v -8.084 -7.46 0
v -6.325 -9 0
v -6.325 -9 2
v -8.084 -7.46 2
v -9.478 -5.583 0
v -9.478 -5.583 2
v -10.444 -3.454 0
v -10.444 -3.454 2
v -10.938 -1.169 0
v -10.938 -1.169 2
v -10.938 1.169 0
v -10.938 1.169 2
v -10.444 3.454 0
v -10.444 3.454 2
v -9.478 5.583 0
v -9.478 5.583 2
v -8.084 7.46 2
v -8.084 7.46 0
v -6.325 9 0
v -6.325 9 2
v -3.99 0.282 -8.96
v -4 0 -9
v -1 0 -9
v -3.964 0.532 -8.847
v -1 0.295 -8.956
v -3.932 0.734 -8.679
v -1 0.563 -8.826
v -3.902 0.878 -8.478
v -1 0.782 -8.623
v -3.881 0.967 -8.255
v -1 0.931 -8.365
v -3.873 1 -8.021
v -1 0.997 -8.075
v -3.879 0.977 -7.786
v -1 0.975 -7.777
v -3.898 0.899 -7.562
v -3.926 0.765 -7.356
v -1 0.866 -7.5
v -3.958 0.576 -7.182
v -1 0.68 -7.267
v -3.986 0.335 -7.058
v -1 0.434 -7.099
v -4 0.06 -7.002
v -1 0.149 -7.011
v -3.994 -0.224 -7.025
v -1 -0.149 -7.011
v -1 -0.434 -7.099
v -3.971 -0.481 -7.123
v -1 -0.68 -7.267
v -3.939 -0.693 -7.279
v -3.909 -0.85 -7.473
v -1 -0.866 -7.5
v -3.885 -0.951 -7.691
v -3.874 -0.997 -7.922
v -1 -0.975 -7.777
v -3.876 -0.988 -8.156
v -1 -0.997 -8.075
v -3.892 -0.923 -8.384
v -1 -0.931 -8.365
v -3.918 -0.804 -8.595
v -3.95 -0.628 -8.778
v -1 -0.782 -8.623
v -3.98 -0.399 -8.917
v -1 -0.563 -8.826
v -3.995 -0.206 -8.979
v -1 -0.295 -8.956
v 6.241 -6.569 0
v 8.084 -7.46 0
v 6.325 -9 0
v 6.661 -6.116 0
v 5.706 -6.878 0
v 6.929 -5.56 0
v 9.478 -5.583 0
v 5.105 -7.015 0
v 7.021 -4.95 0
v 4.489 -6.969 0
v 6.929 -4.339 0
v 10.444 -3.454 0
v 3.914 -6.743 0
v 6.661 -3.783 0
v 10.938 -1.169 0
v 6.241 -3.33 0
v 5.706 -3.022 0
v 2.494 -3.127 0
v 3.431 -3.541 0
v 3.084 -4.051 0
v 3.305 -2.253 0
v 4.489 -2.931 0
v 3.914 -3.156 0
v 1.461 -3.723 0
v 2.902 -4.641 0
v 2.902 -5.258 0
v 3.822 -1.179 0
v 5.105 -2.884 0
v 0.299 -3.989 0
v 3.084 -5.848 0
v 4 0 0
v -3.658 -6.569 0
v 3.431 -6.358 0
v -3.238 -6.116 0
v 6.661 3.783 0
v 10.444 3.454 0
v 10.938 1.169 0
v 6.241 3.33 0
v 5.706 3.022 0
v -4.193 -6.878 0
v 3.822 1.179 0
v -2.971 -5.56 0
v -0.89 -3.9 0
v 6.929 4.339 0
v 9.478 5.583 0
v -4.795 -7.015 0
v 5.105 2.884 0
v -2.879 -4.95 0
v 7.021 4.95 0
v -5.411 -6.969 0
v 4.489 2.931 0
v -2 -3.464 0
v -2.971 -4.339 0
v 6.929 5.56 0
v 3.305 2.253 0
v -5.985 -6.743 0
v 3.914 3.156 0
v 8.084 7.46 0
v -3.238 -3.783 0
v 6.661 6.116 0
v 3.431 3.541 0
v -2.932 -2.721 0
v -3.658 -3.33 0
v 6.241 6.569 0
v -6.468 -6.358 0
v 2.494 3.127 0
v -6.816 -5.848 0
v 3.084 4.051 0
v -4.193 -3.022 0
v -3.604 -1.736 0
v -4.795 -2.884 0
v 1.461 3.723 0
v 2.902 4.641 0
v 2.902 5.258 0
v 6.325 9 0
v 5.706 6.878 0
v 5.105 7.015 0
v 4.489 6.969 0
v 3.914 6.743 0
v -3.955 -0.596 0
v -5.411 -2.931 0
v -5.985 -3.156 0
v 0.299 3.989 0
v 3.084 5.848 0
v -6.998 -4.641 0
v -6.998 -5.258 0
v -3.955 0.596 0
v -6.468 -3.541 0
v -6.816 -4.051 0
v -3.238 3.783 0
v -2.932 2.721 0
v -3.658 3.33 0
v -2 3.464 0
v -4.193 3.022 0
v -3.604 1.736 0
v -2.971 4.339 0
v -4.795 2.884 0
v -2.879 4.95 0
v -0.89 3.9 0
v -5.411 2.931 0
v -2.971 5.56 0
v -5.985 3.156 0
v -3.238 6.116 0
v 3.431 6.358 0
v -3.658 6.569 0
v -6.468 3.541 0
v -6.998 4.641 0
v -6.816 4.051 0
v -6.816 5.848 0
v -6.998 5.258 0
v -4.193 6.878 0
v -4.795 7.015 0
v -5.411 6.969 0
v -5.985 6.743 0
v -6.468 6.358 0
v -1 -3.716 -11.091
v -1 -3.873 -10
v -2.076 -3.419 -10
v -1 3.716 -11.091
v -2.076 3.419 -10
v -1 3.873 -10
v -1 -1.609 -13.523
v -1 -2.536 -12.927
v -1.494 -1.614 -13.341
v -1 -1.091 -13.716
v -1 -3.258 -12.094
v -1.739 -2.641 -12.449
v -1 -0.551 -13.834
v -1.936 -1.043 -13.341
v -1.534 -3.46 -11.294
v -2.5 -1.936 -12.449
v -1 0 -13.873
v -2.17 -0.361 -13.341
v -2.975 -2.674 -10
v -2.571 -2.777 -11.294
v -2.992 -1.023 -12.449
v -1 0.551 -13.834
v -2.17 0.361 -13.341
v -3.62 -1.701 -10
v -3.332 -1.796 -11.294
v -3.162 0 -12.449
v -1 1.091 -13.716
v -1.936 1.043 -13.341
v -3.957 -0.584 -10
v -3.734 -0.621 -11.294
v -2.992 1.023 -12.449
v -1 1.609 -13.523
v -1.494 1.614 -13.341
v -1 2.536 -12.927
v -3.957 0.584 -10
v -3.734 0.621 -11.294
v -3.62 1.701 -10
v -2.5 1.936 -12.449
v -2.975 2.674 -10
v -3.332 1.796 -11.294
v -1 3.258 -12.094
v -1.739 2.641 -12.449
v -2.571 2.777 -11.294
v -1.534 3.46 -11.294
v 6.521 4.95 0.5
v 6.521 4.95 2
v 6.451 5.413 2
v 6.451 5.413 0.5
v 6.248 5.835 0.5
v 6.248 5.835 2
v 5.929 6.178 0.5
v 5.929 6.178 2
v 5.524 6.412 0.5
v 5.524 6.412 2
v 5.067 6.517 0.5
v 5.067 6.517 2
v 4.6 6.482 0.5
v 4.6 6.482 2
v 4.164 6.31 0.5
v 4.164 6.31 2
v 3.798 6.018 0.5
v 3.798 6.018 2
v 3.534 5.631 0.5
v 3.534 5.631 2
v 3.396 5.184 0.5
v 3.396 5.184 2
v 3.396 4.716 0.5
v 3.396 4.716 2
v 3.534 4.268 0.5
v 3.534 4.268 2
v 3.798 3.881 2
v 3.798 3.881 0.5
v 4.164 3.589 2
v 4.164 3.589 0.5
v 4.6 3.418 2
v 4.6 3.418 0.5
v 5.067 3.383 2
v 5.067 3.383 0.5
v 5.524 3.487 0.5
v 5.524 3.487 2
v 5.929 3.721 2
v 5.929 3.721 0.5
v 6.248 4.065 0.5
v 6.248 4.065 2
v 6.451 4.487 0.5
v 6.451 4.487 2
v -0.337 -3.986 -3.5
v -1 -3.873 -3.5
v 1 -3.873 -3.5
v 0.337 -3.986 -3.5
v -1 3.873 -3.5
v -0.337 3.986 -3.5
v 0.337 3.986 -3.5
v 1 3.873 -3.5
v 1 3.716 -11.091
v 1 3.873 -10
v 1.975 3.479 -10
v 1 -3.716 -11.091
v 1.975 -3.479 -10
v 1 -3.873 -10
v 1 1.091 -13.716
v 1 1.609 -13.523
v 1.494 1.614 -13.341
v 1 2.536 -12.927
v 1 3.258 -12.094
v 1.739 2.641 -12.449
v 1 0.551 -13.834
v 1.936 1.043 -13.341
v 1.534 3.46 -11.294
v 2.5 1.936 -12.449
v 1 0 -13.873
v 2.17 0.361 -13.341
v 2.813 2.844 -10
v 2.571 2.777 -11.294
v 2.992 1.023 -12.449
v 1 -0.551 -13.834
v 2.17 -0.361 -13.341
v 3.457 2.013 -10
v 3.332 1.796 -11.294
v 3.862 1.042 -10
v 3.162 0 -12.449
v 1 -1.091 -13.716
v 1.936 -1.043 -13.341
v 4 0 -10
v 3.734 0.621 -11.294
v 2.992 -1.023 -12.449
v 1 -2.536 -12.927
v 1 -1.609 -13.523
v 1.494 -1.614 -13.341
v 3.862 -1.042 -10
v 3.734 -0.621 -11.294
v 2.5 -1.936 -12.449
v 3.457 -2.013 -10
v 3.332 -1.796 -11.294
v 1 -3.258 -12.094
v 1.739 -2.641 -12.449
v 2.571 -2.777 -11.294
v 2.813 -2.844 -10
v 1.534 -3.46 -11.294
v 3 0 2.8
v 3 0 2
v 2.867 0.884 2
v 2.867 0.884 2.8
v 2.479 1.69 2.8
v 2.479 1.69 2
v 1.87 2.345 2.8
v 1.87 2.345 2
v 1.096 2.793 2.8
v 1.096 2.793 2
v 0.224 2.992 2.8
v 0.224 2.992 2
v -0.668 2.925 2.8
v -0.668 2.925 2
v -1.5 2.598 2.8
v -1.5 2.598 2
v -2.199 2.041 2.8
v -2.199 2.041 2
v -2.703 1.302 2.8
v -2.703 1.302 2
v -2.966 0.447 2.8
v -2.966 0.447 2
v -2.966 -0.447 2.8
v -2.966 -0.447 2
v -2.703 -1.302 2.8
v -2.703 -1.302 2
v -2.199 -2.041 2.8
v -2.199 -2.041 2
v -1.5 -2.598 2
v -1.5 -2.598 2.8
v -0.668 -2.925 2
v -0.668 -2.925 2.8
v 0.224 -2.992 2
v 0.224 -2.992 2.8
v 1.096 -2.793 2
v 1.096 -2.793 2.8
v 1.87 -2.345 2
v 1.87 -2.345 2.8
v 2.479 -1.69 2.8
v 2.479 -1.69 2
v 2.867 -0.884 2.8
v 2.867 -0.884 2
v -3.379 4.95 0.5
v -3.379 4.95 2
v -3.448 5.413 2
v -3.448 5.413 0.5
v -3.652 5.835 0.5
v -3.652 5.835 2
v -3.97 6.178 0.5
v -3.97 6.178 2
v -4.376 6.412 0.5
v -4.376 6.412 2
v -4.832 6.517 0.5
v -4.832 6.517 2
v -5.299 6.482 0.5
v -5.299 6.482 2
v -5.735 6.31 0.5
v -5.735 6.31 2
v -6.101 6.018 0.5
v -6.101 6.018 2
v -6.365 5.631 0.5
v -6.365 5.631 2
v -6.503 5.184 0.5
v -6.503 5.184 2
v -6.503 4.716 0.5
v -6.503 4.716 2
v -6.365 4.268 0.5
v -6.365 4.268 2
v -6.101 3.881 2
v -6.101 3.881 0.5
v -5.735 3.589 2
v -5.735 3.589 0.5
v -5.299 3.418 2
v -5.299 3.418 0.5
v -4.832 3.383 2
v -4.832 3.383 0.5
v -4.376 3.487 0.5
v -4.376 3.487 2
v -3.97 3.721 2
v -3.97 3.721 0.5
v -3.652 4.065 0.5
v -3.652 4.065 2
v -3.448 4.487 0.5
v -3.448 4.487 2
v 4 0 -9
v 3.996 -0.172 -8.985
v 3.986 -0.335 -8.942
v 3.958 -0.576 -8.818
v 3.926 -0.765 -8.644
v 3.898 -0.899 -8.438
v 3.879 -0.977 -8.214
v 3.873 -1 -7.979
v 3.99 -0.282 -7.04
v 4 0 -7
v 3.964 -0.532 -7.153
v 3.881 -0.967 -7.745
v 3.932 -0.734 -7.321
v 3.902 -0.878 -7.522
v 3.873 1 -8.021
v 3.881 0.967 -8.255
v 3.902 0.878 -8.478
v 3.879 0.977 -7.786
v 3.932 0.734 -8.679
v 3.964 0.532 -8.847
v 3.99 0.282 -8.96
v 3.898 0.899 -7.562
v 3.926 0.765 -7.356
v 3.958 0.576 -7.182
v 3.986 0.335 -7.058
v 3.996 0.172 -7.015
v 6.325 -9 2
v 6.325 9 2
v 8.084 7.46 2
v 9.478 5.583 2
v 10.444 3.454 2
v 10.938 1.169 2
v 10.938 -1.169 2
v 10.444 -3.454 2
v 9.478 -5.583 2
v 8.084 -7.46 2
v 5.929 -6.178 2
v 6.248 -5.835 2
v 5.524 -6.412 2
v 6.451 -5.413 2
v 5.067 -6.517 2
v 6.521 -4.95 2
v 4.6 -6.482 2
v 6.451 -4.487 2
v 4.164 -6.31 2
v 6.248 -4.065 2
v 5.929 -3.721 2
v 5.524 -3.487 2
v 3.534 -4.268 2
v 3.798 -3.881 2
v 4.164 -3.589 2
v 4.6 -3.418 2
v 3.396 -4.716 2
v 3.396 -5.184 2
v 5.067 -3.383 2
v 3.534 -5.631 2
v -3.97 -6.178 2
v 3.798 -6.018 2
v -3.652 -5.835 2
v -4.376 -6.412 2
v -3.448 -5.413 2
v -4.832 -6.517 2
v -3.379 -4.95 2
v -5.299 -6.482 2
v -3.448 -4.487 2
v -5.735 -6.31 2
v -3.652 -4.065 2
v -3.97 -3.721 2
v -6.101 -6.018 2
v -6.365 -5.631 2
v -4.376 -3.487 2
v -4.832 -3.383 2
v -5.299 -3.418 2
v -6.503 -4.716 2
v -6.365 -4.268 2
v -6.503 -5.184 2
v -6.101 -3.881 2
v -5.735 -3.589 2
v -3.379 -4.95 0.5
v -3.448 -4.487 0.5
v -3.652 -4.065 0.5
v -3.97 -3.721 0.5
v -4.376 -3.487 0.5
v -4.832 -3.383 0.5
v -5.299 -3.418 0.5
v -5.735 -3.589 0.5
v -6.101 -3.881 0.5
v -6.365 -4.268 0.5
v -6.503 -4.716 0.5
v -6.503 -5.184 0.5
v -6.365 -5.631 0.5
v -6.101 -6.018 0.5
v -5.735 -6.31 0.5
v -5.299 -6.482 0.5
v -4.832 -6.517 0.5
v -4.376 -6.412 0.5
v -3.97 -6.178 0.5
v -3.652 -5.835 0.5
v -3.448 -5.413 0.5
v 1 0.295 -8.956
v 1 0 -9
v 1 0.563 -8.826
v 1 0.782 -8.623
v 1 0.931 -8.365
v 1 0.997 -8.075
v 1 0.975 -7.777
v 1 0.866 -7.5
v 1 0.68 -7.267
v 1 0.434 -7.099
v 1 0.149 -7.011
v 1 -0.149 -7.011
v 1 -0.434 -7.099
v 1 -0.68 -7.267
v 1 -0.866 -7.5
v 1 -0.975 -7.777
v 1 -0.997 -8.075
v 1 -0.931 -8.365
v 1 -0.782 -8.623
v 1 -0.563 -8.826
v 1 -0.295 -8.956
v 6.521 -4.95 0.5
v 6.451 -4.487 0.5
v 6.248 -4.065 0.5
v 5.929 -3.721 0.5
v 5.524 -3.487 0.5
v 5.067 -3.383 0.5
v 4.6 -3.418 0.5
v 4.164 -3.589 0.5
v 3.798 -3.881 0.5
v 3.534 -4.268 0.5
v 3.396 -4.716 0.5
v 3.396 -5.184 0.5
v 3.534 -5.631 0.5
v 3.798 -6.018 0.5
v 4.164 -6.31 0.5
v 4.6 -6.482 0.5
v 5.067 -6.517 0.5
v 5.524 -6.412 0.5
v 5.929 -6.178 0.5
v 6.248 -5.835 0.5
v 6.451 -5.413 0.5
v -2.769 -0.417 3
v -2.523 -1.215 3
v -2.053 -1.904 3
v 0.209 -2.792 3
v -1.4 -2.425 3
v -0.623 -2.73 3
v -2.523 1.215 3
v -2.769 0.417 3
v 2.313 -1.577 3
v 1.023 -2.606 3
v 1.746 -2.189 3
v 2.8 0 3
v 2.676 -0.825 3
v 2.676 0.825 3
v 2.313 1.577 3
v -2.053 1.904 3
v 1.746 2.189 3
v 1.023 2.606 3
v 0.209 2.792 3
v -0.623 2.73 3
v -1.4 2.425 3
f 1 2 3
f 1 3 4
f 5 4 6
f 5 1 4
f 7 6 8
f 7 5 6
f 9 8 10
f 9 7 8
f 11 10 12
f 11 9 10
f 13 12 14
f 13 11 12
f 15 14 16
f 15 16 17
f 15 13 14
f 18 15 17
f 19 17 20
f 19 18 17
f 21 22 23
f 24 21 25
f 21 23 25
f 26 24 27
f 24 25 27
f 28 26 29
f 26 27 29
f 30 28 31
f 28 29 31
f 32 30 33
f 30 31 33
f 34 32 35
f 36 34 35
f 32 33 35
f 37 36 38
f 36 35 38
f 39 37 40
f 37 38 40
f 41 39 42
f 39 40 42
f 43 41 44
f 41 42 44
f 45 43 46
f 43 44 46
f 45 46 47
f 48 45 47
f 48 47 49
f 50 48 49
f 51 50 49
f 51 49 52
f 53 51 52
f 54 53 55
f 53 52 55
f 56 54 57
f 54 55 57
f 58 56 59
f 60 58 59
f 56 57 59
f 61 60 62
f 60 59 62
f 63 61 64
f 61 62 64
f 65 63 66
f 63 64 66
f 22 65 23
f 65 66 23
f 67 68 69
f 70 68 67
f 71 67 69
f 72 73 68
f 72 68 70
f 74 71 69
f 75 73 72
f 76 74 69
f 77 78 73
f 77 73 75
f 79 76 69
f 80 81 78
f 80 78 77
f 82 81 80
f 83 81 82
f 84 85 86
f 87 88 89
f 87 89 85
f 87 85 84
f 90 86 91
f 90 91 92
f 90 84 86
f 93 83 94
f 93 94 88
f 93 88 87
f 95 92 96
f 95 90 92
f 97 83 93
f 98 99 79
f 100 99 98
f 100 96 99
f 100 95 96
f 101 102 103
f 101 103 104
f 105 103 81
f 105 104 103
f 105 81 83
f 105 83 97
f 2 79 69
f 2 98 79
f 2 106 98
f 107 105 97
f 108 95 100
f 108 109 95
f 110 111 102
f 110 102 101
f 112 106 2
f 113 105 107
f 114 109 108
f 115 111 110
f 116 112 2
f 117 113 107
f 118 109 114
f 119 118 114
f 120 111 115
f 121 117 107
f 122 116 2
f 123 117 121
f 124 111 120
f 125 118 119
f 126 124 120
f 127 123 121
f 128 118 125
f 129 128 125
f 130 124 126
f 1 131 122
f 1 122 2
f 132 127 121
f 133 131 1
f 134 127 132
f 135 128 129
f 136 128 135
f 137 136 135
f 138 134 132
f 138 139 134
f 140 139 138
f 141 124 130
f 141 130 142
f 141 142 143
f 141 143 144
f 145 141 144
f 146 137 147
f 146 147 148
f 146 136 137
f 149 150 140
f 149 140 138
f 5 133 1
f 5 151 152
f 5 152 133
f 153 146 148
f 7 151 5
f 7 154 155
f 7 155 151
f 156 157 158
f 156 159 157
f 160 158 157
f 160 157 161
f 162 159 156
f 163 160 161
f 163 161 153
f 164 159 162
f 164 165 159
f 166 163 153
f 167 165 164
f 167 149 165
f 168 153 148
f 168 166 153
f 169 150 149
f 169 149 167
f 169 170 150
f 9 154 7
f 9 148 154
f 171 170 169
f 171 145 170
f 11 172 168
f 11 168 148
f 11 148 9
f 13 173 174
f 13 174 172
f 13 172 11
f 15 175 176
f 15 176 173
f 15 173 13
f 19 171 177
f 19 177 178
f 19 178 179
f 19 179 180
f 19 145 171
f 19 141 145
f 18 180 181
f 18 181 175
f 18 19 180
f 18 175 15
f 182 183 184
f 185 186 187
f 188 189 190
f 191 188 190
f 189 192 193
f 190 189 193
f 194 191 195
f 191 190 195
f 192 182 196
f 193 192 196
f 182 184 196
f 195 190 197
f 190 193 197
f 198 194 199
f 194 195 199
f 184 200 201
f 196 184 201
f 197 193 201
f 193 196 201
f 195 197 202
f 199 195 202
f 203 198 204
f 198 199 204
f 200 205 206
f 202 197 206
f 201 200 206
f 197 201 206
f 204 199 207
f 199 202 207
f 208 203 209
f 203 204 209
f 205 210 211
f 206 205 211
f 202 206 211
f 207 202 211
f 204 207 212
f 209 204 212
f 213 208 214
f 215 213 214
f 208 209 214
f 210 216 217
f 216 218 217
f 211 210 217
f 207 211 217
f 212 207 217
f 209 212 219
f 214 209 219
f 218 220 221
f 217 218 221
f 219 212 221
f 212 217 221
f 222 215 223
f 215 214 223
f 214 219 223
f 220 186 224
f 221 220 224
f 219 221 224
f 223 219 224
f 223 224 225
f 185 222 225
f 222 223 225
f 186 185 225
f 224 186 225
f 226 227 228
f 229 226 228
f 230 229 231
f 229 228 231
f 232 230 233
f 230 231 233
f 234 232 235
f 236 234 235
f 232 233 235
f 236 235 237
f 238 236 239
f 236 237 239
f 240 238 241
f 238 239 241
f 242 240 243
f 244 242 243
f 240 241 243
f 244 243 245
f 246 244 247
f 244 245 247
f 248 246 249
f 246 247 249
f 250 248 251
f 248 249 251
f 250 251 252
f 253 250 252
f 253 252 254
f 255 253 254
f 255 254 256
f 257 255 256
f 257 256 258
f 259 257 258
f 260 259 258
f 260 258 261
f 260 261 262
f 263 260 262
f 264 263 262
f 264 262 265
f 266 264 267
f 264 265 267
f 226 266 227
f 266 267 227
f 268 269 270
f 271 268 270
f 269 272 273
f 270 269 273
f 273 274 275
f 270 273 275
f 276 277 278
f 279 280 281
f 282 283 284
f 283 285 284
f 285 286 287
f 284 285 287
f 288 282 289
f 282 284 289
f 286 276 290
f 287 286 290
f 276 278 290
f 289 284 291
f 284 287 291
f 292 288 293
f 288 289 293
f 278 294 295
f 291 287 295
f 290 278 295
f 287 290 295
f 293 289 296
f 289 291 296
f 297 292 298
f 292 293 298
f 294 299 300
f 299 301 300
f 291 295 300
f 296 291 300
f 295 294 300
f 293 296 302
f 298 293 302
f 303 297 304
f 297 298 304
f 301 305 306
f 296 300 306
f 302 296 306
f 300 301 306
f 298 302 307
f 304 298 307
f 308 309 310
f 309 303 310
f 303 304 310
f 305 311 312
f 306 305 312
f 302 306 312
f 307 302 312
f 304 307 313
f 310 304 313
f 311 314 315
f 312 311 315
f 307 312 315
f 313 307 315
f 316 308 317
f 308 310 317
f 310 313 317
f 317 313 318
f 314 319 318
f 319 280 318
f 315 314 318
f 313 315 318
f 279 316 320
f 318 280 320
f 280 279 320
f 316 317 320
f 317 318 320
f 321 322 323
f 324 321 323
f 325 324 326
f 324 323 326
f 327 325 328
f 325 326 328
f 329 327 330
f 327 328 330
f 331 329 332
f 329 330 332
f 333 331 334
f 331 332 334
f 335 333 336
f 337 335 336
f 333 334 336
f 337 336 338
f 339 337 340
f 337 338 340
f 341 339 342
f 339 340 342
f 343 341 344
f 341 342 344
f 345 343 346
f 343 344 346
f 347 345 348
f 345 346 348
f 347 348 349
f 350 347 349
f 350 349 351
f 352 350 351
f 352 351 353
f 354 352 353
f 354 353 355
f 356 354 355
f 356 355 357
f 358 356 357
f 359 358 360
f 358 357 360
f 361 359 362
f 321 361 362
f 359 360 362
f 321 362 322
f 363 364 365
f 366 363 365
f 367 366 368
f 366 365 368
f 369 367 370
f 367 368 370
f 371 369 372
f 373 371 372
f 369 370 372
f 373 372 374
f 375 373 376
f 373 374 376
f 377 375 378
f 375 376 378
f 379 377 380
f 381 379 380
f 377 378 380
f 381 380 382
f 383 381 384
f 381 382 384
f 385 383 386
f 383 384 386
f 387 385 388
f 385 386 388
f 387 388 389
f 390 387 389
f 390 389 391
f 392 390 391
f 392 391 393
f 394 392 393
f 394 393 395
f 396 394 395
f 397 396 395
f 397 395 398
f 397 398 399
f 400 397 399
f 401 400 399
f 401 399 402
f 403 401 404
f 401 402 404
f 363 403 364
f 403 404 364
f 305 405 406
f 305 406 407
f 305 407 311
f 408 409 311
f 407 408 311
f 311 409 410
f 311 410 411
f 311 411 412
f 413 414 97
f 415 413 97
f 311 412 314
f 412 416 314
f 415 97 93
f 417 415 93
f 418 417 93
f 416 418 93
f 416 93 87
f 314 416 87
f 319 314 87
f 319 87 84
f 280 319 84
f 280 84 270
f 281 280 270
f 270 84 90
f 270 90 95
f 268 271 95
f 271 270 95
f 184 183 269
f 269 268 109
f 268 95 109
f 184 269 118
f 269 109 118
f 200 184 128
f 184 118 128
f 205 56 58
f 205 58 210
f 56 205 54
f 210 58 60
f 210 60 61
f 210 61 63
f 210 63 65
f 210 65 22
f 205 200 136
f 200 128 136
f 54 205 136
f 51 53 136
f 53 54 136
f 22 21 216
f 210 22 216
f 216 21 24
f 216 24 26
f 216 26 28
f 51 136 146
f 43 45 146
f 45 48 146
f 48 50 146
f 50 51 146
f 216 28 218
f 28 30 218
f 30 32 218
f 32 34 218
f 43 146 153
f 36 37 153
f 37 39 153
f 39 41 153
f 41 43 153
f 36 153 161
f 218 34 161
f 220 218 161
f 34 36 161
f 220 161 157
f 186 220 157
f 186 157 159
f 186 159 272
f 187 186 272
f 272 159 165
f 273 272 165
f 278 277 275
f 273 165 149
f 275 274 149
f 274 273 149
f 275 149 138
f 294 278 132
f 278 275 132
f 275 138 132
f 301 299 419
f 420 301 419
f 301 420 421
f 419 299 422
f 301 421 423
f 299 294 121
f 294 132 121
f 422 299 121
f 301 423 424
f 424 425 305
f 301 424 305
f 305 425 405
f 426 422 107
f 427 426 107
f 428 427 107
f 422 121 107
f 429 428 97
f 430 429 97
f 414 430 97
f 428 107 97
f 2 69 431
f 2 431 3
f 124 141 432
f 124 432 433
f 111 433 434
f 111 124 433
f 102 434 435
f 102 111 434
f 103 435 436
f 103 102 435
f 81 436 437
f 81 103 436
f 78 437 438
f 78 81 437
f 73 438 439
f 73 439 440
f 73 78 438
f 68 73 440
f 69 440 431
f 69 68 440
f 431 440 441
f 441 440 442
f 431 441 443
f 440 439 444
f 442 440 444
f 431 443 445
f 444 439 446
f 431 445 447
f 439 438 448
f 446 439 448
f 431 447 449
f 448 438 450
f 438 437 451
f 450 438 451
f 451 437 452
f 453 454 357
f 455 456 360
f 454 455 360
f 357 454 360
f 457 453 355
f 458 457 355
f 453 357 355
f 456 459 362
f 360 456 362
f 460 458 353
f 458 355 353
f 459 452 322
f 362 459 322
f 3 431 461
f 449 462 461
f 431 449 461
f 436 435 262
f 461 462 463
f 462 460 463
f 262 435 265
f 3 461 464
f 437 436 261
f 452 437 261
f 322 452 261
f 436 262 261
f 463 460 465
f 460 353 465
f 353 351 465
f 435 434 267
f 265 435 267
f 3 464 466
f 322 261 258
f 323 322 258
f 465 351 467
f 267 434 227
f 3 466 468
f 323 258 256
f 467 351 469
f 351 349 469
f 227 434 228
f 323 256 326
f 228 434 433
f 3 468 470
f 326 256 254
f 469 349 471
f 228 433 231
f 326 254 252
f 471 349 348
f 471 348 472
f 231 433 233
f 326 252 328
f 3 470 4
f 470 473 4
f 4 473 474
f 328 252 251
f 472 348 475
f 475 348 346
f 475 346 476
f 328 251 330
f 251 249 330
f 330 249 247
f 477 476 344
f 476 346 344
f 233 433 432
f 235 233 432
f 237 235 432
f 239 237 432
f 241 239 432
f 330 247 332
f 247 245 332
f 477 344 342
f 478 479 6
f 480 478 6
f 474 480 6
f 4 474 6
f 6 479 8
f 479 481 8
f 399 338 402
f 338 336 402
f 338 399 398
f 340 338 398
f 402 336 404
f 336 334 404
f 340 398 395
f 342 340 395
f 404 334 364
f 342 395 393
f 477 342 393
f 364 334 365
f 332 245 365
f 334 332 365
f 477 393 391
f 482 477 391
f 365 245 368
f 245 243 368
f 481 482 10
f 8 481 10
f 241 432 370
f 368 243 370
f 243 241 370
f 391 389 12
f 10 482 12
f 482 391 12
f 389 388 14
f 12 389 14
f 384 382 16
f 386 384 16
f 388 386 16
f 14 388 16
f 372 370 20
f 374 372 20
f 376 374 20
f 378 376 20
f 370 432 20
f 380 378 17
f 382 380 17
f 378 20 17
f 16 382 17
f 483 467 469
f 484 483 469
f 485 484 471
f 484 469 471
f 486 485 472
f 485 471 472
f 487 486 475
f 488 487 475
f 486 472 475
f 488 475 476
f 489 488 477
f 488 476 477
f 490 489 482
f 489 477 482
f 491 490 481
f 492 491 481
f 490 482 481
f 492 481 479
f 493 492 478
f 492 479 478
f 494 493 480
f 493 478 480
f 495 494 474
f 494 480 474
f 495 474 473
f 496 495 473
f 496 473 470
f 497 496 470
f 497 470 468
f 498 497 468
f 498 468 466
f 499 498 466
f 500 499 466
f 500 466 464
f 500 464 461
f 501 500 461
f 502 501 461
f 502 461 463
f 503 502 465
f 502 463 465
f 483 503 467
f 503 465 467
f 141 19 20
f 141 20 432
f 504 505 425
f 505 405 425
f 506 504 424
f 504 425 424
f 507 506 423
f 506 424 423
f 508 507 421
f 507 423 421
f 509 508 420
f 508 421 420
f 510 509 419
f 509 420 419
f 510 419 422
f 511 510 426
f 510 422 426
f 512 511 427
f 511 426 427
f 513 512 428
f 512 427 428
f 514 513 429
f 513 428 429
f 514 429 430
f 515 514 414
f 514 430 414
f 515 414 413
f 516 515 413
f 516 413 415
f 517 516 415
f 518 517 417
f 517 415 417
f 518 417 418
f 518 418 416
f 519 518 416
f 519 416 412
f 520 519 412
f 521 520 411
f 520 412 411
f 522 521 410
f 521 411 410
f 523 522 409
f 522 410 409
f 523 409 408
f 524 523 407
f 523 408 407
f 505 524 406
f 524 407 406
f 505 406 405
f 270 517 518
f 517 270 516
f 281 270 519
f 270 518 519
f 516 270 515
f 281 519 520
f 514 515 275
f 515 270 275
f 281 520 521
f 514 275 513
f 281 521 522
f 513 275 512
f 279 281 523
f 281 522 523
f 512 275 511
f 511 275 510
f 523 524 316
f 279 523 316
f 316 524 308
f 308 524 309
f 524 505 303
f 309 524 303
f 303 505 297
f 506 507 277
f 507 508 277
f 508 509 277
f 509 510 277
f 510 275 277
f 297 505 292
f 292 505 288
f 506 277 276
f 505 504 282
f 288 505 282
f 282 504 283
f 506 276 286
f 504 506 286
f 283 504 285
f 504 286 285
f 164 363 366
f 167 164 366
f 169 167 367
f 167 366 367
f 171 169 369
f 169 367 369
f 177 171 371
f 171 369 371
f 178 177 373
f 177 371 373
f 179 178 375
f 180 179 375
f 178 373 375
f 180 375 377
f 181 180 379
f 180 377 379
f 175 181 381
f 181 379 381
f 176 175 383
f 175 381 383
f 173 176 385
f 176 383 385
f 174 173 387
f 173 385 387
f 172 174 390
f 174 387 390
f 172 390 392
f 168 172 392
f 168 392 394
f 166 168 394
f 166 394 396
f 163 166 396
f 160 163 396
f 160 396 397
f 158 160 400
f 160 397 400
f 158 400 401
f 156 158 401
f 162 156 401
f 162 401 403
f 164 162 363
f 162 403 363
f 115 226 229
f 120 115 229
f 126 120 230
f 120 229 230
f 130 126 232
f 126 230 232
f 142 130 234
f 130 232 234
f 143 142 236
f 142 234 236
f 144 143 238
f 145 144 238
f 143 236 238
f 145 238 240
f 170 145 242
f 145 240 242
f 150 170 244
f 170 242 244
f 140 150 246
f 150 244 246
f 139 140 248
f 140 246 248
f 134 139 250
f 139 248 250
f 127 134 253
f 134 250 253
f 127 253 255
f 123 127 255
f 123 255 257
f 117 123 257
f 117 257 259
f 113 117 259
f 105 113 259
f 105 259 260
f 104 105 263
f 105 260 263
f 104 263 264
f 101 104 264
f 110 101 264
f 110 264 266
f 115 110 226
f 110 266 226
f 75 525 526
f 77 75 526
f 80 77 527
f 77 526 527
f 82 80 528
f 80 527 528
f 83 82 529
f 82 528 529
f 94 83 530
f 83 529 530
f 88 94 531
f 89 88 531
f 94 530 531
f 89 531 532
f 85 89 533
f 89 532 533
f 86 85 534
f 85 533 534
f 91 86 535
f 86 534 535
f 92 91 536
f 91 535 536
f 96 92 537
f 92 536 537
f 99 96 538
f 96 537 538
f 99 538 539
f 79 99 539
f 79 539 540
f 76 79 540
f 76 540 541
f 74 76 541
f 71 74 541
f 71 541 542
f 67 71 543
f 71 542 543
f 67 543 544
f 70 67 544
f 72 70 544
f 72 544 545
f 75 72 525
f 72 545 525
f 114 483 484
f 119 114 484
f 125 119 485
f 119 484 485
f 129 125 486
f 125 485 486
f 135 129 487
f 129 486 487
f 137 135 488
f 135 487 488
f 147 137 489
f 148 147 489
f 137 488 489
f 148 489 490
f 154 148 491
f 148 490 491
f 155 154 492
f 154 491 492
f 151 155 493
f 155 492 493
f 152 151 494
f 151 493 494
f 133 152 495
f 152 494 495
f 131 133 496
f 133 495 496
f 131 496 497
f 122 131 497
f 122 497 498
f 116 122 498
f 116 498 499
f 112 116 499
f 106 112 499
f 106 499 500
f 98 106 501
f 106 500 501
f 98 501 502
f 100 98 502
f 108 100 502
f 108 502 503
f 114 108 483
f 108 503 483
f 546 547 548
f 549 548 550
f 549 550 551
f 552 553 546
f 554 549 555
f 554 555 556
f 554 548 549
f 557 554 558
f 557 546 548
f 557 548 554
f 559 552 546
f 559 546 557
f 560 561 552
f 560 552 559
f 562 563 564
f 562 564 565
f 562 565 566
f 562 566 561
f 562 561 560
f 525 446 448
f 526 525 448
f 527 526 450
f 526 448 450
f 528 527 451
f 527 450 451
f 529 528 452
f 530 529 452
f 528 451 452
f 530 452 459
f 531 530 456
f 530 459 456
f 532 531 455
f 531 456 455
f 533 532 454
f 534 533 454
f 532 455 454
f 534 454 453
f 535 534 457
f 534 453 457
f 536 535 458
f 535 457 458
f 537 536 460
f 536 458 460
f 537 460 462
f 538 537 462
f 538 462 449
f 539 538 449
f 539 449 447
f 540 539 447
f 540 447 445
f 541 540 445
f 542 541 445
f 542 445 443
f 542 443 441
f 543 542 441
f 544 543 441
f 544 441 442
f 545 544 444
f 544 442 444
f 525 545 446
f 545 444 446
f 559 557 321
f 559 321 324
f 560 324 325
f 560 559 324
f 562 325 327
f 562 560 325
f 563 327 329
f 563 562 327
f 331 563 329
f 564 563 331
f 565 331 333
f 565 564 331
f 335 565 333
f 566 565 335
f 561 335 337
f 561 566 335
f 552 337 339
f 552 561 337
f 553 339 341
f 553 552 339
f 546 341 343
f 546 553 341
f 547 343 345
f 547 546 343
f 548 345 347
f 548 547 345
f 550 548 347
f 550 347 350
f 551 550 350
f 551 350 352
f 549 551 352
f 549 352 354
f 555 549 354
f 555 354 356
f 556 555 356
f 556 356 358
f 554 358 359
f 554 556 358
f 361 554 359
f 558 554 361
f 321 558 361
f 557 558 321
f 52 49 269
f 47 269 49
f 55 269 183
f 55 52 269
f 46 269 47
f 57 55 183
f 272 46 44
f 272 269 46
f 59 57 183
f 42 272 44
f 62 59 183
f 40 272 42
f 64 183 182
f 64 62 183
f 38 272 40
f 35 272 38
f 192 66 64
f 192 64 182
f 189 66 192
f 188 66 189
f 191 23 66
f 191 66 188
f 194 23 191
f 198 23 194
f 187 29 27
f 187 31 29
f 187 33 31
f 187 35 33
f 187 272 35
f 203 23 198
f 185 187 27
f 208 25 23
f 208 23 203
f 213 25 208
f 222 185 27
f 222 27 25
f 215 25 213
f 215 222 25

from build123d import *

# Parameters (mm, degrees)
BOSS_EXTRUDE1_DEPTH = 2
SKETCH2_R           = 1.571161349
CUT_EXTRUDE1_DEPTH  = 2
CHAMFER1_SIZE       = 0.5
SKETCH4_W           = 2
SKETCH4_H           = 12.352861416
CUT_EXTRUDE2_DEPTH  = 13.5
SKETCH5_R           = 1
CUT_EXTRUDE3_DEPTH  = 13.5
SKETCH6_R           = 3
BOSS_EXTRUDE2_DEPTH = 1
CHAMFER2_SIZE       = 0.2


with BuildPart() as part:
    # Sketch1 → Boss-Extrude1 (new body)
    with BuildSketch(Plane.XY):
        with BuildLine():
            Line((-6.32455532, 9), (6.32455532, 9))
            ThreePointArc((6.32455532, 9), (11, 0), (6.32455532, -9))
            Line((6.32455532, -9), (-6.32455532, -9))
            ThreePointArc((-6.32455532, -9), (-11, 0), (-6.32455532, 9))
        make_face()
    extrude(amount=BOSS_EXTRUDE1_DEPTH)

    # Sketch2 → Cut-Extrude1 (cut)
    with BuildSketch(Plane.XY.offset(2)):
        with Locations((4.949747468, 4.949747468)):
            Circle(SKETCH2_R)
        with Locations((4.949747468, -4.949747468)):
            Circle(SKETCH2_R)
        with Locations((-4.949747468, -4.949747468)):
            Circle(SKETCH2_R)
        with Locations((-4.949747468, 4.949747468)):
            Circle(SKETCH2_R)
    extrude(amount=-CUT_EXTRUDE1_DEPTH, mode=Mode.SUBTRACT)

    # Chamfer1
    chamfer1_edges = [part.edges().sort_by_distance(p)[0] for p in [
        (-6.520908817, 4.949747468, 0),
        (-6.520908817, -4.949747468, 0),
        (3.378586119, -4.949747468, 0),
        (3.378586119, 4.949747468, 0),
    ]]
    chamfer(chamfer1_edges, length=CHAMFER1_SIZE)

    # Sketch3 → Revolve1 (revolve)
    with BuildSketch(Plane(origin=(0, 0, 0), x_dir=(1, 0, 0), z_dir=(0, 1, 0))):
        with BuildLine():
            Line((0, 0), (0, 14))
            ThreePointArc((0, 14), (2.828427125, 12.828427125), (4, 10))
            Line((4, 10), (4, 0))
            Line((4, 0), (0, 0))
        make_face()
    revolve(axis=Axis((0, 0, 0), (0, 0, -1)))

    # Sketch4 → Cut-Extrude2 (cut, symmetric)
    with BuildSketch(Plane(origin=(0, 0, 0), x_dir=(1, 0, 0), z_dir=(0, 1, 0))):
        with Locations((0, 9.676430708)):
            Rectangle(SKETCH4_W, SKETCH4_H)
    extrude(amount=CUT_EXTRUDE2_DEPTH, both=True, mode=Mode.SUBTRACT)

    # Sketch5 → Cut-Extrude3 (cut, symmetric)
    with BuildSketch(Plane(origin=(0, 0, 0), x_dir=(0, 0, -1), z_dir=(1, 0, 0))):
        with Locations((8, 0)):
            Circle(SKETCH5_R)
    extrude(amount=CUT_EXTRUDE3_DEPTH, both=True, mode=Mode.SUBTRACT)

    # Sketch6 → Boss-Extrude2 (add)
    with BuildSketch(Plane.XY.offset(2)):
        Circle(SKETCH6_R)
    extrude(amount=BOSS_EXTRUDE2_DEPTH)

    # Chamfer2
    chamfer2_edges = [part.edges().sort_by_distance(p)[0] for p in [
        (-3, 0, 3),
    ]]
    chamfer(chamfer2_edges, length=CHAMFER2_SIZE)


solid = part.part
